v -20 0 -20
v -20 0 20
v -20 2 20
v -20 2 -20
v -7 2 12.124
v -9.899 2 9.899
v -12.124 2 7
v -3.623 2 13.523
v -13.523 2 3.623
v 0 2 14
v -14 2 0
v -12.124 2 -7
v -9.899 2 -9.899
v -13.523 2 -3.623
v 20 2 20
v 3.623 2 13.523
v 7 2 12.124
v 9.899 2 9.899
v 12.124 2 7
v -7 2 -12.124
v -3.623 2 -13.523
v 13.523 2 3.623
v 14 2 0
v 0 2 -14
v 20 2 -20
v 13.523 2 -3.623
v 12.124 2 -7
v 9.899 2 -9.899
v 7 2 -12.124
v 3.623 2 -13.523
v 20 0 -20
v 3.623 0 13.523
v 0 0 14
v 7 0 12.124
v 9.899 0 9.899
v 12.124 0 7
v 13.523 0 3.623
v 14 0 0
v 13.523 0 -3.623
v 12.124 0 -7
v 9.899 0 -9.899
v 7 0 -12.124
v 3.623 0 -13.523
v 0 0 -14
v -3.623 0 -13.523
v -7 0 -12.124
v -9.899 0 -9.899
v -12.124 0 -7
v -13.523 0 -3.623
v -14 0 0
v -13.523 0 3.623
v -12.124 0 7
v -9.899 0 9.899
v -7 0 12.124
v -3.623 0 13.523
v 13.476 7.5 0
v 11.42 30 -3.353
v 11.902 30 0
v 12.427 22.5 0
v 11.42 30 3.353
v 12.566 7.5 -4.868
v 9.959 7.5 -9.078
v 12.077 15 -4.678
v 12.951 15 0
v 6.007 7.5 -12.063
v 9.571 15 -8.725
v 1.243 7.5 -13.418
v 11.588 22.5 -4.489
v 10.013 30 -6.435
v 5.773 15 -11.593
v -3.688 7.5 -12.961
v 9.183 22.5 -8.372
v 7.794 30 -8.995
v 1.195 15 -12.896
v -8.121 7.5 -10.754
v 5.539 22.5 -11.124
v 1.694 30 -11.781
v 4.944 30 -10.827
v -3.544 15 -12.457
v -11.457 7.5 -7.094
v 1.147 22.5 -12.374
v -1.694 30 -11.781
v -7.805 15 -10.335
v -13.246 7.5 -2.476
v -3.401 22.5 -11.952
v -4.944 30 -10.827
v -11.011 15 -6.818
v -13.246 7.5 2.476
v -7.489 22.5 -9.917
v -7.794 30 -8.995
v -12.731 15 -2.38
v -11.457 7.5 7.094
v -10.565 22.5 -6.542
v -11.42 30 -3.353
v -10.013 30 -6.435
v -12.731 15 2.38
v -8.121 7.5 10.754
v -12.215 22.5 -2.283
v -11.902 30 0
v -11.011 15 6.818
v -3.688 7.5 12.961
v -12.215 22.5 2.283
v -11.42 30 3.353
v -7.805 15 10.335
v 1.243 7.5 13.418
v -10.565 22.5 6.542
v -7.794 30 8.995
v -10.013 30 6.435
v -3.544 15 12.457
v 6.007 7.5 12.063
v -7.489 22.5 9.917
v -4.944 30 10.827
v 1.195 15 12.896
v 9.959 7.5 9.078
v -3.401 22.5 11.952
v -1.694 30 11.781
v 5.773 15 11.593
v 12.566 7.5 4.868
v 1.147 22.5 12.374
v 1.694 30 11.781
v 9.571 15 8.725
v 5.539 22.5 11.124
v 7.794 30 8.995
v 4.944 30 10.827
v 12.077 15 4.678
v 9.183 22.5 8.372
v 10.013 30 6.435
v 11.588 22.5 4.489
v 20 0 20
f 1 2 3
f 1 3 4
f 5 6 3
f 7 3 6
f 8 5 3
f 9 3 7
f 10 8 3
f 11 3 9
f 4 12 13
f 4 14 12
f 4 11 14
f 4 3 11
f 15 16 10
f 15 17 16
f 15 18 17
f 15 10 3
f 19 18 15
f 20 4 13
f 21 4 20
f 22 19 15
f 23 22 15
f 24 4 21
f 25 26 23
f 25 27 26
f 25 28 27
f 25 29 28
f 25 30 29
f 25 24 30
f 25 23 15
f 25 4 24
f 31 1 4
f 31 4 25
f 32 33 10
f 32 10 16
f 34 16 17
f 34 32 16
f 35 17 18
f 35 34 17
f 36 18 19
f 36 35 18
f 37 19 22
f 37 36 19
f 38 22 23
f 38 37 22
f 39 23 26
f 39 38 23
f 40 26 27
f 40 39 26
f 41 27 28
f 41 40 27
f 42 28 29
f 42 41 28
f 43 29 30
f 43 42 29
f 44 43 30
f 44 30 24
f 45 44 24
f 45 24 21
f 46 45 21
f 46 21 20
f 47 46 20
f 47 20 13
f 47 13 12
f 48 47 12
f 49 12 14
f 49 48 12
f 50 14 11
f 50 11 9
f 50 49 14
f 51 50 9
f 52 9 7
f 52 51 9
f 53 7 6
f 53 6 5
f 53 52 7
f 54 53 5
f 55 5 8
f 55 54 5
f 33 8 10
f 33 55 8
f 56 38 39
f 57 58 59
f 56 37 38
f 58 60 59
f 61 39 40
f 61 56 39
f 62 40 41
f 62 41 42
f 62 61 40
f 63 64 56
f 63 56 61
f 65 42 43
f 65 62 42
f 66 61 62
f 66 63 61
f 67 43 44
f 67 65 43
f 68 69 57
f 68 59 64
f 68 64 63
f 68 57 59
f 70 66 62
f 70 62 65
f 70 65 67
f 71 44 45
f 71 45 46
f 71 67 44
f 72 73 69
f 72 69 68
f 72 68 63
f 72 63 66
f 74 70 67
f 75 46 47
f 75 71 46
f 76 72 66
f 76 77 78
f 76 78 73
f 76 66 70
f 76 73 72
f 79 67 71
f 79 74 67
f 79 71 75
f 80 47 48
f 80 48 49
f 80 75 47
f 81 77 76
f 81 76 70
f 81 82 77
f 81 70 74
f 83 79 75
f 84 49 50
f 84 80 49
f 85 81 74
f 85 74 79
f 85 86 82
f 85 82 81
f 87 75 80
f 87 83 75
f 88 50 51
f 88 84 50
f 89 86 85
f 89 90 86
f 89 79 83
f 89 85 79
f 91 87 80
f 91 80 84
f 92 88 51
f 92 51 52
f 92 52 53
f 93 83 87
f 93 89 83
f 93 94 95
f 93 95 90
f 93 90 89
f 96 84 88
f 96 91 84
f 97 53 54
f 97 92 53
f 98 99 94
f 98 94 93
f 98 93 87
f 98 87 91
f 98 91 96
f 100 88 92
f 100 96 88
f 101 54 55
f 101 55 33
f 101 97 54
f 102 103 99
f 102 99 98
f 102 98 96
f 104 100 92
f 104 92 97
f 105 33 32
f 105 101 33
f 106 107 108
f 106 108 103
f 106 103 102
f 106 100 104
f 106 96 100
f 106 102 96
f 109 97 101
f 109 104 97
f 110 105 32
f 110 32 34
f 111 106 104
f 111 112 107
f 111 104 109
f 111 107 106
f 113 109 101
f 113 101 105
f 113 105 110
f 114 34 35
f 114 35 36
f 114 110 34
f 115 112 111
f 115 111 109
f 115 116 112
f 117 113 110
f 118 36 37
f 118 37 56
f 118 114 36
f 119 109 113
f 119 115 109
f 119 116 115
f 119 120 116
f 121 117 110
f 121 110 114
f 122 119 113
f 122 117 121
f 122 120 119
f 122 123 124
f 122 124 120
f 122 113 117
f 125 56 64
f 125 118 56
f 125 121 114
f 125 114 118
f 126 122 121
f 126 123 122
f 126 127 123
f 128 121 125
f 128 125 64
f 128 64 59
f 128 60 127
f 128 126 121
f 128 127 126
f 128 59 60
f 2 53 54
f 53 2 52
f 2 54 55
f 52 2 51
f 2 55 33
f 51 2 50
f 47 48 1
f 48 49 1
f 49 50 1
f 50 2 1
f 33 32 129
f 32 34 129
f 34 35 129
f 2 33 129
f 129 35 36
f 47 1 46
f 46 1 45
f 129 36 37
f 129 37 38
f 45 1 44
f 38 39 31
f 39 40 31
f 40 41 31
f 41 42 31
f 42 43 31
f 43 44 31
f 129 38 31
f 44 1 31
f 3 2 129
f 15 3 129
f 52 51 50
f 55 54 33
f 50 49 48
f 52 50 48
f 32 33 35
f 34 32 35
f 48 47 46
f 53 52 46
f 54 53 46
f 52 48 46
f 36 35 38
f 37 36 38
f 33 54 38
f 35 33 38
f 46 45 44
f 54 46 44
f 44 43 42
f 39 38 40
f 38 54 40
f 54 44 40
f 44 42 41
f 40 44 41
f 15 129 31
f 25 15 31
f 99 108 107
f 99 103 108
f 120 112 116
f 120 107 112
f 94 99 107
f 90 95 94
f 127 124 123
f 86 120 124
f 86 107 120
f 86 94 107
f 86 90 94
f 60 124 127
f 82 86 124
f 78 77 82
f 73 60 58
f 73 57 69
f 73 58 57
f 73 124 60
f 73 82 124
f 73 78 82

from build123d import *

# Parameters (mm, degrees)
SKETCH1_R           = 14
BOSS_EXTRUDE1_DEPTH = 30
BOSS_EXTRUDE1_TAPER = 4
SKETCH1_3_W         = 40
SKETCH1_3_H         = 40
SKETCH1_3_R         = 14
BOSS_EXTRUDE2_DEPTH = 2


with BuildPart() as part:
    # Sketch1 → Boss-Extrude1 (new body)
    with BuildSketch(Plane(origin=(0, 0, 0), x_dir=(1, 0, 0), z_dir=(0, 1, 0))):
        Circle(SKETCH1_R)
    extrude(amount=BOSS_EXTRUDE1_DEPTH, taper=BOSS_EXTRUDE1_TAPER)


with BuildPart() as body_2:
    # Sketch1<3> → Boss-Extrude2 (new body)
    with BuildSketch(Plane(origin=(0, 0, 0), x_dir=(1, 0, 0), z_dir=(0, 1, 0))):
        Rectangle(SKETCH1_3_W, SKETCH1_3_H)
        Circle(SKETCH1_3_R, mode=Mode.SUBTRACT)
    extrude(amount=BOSS_EXTRUDE2_DEPTH)


solid = Compound([part.part, body_2.part])
